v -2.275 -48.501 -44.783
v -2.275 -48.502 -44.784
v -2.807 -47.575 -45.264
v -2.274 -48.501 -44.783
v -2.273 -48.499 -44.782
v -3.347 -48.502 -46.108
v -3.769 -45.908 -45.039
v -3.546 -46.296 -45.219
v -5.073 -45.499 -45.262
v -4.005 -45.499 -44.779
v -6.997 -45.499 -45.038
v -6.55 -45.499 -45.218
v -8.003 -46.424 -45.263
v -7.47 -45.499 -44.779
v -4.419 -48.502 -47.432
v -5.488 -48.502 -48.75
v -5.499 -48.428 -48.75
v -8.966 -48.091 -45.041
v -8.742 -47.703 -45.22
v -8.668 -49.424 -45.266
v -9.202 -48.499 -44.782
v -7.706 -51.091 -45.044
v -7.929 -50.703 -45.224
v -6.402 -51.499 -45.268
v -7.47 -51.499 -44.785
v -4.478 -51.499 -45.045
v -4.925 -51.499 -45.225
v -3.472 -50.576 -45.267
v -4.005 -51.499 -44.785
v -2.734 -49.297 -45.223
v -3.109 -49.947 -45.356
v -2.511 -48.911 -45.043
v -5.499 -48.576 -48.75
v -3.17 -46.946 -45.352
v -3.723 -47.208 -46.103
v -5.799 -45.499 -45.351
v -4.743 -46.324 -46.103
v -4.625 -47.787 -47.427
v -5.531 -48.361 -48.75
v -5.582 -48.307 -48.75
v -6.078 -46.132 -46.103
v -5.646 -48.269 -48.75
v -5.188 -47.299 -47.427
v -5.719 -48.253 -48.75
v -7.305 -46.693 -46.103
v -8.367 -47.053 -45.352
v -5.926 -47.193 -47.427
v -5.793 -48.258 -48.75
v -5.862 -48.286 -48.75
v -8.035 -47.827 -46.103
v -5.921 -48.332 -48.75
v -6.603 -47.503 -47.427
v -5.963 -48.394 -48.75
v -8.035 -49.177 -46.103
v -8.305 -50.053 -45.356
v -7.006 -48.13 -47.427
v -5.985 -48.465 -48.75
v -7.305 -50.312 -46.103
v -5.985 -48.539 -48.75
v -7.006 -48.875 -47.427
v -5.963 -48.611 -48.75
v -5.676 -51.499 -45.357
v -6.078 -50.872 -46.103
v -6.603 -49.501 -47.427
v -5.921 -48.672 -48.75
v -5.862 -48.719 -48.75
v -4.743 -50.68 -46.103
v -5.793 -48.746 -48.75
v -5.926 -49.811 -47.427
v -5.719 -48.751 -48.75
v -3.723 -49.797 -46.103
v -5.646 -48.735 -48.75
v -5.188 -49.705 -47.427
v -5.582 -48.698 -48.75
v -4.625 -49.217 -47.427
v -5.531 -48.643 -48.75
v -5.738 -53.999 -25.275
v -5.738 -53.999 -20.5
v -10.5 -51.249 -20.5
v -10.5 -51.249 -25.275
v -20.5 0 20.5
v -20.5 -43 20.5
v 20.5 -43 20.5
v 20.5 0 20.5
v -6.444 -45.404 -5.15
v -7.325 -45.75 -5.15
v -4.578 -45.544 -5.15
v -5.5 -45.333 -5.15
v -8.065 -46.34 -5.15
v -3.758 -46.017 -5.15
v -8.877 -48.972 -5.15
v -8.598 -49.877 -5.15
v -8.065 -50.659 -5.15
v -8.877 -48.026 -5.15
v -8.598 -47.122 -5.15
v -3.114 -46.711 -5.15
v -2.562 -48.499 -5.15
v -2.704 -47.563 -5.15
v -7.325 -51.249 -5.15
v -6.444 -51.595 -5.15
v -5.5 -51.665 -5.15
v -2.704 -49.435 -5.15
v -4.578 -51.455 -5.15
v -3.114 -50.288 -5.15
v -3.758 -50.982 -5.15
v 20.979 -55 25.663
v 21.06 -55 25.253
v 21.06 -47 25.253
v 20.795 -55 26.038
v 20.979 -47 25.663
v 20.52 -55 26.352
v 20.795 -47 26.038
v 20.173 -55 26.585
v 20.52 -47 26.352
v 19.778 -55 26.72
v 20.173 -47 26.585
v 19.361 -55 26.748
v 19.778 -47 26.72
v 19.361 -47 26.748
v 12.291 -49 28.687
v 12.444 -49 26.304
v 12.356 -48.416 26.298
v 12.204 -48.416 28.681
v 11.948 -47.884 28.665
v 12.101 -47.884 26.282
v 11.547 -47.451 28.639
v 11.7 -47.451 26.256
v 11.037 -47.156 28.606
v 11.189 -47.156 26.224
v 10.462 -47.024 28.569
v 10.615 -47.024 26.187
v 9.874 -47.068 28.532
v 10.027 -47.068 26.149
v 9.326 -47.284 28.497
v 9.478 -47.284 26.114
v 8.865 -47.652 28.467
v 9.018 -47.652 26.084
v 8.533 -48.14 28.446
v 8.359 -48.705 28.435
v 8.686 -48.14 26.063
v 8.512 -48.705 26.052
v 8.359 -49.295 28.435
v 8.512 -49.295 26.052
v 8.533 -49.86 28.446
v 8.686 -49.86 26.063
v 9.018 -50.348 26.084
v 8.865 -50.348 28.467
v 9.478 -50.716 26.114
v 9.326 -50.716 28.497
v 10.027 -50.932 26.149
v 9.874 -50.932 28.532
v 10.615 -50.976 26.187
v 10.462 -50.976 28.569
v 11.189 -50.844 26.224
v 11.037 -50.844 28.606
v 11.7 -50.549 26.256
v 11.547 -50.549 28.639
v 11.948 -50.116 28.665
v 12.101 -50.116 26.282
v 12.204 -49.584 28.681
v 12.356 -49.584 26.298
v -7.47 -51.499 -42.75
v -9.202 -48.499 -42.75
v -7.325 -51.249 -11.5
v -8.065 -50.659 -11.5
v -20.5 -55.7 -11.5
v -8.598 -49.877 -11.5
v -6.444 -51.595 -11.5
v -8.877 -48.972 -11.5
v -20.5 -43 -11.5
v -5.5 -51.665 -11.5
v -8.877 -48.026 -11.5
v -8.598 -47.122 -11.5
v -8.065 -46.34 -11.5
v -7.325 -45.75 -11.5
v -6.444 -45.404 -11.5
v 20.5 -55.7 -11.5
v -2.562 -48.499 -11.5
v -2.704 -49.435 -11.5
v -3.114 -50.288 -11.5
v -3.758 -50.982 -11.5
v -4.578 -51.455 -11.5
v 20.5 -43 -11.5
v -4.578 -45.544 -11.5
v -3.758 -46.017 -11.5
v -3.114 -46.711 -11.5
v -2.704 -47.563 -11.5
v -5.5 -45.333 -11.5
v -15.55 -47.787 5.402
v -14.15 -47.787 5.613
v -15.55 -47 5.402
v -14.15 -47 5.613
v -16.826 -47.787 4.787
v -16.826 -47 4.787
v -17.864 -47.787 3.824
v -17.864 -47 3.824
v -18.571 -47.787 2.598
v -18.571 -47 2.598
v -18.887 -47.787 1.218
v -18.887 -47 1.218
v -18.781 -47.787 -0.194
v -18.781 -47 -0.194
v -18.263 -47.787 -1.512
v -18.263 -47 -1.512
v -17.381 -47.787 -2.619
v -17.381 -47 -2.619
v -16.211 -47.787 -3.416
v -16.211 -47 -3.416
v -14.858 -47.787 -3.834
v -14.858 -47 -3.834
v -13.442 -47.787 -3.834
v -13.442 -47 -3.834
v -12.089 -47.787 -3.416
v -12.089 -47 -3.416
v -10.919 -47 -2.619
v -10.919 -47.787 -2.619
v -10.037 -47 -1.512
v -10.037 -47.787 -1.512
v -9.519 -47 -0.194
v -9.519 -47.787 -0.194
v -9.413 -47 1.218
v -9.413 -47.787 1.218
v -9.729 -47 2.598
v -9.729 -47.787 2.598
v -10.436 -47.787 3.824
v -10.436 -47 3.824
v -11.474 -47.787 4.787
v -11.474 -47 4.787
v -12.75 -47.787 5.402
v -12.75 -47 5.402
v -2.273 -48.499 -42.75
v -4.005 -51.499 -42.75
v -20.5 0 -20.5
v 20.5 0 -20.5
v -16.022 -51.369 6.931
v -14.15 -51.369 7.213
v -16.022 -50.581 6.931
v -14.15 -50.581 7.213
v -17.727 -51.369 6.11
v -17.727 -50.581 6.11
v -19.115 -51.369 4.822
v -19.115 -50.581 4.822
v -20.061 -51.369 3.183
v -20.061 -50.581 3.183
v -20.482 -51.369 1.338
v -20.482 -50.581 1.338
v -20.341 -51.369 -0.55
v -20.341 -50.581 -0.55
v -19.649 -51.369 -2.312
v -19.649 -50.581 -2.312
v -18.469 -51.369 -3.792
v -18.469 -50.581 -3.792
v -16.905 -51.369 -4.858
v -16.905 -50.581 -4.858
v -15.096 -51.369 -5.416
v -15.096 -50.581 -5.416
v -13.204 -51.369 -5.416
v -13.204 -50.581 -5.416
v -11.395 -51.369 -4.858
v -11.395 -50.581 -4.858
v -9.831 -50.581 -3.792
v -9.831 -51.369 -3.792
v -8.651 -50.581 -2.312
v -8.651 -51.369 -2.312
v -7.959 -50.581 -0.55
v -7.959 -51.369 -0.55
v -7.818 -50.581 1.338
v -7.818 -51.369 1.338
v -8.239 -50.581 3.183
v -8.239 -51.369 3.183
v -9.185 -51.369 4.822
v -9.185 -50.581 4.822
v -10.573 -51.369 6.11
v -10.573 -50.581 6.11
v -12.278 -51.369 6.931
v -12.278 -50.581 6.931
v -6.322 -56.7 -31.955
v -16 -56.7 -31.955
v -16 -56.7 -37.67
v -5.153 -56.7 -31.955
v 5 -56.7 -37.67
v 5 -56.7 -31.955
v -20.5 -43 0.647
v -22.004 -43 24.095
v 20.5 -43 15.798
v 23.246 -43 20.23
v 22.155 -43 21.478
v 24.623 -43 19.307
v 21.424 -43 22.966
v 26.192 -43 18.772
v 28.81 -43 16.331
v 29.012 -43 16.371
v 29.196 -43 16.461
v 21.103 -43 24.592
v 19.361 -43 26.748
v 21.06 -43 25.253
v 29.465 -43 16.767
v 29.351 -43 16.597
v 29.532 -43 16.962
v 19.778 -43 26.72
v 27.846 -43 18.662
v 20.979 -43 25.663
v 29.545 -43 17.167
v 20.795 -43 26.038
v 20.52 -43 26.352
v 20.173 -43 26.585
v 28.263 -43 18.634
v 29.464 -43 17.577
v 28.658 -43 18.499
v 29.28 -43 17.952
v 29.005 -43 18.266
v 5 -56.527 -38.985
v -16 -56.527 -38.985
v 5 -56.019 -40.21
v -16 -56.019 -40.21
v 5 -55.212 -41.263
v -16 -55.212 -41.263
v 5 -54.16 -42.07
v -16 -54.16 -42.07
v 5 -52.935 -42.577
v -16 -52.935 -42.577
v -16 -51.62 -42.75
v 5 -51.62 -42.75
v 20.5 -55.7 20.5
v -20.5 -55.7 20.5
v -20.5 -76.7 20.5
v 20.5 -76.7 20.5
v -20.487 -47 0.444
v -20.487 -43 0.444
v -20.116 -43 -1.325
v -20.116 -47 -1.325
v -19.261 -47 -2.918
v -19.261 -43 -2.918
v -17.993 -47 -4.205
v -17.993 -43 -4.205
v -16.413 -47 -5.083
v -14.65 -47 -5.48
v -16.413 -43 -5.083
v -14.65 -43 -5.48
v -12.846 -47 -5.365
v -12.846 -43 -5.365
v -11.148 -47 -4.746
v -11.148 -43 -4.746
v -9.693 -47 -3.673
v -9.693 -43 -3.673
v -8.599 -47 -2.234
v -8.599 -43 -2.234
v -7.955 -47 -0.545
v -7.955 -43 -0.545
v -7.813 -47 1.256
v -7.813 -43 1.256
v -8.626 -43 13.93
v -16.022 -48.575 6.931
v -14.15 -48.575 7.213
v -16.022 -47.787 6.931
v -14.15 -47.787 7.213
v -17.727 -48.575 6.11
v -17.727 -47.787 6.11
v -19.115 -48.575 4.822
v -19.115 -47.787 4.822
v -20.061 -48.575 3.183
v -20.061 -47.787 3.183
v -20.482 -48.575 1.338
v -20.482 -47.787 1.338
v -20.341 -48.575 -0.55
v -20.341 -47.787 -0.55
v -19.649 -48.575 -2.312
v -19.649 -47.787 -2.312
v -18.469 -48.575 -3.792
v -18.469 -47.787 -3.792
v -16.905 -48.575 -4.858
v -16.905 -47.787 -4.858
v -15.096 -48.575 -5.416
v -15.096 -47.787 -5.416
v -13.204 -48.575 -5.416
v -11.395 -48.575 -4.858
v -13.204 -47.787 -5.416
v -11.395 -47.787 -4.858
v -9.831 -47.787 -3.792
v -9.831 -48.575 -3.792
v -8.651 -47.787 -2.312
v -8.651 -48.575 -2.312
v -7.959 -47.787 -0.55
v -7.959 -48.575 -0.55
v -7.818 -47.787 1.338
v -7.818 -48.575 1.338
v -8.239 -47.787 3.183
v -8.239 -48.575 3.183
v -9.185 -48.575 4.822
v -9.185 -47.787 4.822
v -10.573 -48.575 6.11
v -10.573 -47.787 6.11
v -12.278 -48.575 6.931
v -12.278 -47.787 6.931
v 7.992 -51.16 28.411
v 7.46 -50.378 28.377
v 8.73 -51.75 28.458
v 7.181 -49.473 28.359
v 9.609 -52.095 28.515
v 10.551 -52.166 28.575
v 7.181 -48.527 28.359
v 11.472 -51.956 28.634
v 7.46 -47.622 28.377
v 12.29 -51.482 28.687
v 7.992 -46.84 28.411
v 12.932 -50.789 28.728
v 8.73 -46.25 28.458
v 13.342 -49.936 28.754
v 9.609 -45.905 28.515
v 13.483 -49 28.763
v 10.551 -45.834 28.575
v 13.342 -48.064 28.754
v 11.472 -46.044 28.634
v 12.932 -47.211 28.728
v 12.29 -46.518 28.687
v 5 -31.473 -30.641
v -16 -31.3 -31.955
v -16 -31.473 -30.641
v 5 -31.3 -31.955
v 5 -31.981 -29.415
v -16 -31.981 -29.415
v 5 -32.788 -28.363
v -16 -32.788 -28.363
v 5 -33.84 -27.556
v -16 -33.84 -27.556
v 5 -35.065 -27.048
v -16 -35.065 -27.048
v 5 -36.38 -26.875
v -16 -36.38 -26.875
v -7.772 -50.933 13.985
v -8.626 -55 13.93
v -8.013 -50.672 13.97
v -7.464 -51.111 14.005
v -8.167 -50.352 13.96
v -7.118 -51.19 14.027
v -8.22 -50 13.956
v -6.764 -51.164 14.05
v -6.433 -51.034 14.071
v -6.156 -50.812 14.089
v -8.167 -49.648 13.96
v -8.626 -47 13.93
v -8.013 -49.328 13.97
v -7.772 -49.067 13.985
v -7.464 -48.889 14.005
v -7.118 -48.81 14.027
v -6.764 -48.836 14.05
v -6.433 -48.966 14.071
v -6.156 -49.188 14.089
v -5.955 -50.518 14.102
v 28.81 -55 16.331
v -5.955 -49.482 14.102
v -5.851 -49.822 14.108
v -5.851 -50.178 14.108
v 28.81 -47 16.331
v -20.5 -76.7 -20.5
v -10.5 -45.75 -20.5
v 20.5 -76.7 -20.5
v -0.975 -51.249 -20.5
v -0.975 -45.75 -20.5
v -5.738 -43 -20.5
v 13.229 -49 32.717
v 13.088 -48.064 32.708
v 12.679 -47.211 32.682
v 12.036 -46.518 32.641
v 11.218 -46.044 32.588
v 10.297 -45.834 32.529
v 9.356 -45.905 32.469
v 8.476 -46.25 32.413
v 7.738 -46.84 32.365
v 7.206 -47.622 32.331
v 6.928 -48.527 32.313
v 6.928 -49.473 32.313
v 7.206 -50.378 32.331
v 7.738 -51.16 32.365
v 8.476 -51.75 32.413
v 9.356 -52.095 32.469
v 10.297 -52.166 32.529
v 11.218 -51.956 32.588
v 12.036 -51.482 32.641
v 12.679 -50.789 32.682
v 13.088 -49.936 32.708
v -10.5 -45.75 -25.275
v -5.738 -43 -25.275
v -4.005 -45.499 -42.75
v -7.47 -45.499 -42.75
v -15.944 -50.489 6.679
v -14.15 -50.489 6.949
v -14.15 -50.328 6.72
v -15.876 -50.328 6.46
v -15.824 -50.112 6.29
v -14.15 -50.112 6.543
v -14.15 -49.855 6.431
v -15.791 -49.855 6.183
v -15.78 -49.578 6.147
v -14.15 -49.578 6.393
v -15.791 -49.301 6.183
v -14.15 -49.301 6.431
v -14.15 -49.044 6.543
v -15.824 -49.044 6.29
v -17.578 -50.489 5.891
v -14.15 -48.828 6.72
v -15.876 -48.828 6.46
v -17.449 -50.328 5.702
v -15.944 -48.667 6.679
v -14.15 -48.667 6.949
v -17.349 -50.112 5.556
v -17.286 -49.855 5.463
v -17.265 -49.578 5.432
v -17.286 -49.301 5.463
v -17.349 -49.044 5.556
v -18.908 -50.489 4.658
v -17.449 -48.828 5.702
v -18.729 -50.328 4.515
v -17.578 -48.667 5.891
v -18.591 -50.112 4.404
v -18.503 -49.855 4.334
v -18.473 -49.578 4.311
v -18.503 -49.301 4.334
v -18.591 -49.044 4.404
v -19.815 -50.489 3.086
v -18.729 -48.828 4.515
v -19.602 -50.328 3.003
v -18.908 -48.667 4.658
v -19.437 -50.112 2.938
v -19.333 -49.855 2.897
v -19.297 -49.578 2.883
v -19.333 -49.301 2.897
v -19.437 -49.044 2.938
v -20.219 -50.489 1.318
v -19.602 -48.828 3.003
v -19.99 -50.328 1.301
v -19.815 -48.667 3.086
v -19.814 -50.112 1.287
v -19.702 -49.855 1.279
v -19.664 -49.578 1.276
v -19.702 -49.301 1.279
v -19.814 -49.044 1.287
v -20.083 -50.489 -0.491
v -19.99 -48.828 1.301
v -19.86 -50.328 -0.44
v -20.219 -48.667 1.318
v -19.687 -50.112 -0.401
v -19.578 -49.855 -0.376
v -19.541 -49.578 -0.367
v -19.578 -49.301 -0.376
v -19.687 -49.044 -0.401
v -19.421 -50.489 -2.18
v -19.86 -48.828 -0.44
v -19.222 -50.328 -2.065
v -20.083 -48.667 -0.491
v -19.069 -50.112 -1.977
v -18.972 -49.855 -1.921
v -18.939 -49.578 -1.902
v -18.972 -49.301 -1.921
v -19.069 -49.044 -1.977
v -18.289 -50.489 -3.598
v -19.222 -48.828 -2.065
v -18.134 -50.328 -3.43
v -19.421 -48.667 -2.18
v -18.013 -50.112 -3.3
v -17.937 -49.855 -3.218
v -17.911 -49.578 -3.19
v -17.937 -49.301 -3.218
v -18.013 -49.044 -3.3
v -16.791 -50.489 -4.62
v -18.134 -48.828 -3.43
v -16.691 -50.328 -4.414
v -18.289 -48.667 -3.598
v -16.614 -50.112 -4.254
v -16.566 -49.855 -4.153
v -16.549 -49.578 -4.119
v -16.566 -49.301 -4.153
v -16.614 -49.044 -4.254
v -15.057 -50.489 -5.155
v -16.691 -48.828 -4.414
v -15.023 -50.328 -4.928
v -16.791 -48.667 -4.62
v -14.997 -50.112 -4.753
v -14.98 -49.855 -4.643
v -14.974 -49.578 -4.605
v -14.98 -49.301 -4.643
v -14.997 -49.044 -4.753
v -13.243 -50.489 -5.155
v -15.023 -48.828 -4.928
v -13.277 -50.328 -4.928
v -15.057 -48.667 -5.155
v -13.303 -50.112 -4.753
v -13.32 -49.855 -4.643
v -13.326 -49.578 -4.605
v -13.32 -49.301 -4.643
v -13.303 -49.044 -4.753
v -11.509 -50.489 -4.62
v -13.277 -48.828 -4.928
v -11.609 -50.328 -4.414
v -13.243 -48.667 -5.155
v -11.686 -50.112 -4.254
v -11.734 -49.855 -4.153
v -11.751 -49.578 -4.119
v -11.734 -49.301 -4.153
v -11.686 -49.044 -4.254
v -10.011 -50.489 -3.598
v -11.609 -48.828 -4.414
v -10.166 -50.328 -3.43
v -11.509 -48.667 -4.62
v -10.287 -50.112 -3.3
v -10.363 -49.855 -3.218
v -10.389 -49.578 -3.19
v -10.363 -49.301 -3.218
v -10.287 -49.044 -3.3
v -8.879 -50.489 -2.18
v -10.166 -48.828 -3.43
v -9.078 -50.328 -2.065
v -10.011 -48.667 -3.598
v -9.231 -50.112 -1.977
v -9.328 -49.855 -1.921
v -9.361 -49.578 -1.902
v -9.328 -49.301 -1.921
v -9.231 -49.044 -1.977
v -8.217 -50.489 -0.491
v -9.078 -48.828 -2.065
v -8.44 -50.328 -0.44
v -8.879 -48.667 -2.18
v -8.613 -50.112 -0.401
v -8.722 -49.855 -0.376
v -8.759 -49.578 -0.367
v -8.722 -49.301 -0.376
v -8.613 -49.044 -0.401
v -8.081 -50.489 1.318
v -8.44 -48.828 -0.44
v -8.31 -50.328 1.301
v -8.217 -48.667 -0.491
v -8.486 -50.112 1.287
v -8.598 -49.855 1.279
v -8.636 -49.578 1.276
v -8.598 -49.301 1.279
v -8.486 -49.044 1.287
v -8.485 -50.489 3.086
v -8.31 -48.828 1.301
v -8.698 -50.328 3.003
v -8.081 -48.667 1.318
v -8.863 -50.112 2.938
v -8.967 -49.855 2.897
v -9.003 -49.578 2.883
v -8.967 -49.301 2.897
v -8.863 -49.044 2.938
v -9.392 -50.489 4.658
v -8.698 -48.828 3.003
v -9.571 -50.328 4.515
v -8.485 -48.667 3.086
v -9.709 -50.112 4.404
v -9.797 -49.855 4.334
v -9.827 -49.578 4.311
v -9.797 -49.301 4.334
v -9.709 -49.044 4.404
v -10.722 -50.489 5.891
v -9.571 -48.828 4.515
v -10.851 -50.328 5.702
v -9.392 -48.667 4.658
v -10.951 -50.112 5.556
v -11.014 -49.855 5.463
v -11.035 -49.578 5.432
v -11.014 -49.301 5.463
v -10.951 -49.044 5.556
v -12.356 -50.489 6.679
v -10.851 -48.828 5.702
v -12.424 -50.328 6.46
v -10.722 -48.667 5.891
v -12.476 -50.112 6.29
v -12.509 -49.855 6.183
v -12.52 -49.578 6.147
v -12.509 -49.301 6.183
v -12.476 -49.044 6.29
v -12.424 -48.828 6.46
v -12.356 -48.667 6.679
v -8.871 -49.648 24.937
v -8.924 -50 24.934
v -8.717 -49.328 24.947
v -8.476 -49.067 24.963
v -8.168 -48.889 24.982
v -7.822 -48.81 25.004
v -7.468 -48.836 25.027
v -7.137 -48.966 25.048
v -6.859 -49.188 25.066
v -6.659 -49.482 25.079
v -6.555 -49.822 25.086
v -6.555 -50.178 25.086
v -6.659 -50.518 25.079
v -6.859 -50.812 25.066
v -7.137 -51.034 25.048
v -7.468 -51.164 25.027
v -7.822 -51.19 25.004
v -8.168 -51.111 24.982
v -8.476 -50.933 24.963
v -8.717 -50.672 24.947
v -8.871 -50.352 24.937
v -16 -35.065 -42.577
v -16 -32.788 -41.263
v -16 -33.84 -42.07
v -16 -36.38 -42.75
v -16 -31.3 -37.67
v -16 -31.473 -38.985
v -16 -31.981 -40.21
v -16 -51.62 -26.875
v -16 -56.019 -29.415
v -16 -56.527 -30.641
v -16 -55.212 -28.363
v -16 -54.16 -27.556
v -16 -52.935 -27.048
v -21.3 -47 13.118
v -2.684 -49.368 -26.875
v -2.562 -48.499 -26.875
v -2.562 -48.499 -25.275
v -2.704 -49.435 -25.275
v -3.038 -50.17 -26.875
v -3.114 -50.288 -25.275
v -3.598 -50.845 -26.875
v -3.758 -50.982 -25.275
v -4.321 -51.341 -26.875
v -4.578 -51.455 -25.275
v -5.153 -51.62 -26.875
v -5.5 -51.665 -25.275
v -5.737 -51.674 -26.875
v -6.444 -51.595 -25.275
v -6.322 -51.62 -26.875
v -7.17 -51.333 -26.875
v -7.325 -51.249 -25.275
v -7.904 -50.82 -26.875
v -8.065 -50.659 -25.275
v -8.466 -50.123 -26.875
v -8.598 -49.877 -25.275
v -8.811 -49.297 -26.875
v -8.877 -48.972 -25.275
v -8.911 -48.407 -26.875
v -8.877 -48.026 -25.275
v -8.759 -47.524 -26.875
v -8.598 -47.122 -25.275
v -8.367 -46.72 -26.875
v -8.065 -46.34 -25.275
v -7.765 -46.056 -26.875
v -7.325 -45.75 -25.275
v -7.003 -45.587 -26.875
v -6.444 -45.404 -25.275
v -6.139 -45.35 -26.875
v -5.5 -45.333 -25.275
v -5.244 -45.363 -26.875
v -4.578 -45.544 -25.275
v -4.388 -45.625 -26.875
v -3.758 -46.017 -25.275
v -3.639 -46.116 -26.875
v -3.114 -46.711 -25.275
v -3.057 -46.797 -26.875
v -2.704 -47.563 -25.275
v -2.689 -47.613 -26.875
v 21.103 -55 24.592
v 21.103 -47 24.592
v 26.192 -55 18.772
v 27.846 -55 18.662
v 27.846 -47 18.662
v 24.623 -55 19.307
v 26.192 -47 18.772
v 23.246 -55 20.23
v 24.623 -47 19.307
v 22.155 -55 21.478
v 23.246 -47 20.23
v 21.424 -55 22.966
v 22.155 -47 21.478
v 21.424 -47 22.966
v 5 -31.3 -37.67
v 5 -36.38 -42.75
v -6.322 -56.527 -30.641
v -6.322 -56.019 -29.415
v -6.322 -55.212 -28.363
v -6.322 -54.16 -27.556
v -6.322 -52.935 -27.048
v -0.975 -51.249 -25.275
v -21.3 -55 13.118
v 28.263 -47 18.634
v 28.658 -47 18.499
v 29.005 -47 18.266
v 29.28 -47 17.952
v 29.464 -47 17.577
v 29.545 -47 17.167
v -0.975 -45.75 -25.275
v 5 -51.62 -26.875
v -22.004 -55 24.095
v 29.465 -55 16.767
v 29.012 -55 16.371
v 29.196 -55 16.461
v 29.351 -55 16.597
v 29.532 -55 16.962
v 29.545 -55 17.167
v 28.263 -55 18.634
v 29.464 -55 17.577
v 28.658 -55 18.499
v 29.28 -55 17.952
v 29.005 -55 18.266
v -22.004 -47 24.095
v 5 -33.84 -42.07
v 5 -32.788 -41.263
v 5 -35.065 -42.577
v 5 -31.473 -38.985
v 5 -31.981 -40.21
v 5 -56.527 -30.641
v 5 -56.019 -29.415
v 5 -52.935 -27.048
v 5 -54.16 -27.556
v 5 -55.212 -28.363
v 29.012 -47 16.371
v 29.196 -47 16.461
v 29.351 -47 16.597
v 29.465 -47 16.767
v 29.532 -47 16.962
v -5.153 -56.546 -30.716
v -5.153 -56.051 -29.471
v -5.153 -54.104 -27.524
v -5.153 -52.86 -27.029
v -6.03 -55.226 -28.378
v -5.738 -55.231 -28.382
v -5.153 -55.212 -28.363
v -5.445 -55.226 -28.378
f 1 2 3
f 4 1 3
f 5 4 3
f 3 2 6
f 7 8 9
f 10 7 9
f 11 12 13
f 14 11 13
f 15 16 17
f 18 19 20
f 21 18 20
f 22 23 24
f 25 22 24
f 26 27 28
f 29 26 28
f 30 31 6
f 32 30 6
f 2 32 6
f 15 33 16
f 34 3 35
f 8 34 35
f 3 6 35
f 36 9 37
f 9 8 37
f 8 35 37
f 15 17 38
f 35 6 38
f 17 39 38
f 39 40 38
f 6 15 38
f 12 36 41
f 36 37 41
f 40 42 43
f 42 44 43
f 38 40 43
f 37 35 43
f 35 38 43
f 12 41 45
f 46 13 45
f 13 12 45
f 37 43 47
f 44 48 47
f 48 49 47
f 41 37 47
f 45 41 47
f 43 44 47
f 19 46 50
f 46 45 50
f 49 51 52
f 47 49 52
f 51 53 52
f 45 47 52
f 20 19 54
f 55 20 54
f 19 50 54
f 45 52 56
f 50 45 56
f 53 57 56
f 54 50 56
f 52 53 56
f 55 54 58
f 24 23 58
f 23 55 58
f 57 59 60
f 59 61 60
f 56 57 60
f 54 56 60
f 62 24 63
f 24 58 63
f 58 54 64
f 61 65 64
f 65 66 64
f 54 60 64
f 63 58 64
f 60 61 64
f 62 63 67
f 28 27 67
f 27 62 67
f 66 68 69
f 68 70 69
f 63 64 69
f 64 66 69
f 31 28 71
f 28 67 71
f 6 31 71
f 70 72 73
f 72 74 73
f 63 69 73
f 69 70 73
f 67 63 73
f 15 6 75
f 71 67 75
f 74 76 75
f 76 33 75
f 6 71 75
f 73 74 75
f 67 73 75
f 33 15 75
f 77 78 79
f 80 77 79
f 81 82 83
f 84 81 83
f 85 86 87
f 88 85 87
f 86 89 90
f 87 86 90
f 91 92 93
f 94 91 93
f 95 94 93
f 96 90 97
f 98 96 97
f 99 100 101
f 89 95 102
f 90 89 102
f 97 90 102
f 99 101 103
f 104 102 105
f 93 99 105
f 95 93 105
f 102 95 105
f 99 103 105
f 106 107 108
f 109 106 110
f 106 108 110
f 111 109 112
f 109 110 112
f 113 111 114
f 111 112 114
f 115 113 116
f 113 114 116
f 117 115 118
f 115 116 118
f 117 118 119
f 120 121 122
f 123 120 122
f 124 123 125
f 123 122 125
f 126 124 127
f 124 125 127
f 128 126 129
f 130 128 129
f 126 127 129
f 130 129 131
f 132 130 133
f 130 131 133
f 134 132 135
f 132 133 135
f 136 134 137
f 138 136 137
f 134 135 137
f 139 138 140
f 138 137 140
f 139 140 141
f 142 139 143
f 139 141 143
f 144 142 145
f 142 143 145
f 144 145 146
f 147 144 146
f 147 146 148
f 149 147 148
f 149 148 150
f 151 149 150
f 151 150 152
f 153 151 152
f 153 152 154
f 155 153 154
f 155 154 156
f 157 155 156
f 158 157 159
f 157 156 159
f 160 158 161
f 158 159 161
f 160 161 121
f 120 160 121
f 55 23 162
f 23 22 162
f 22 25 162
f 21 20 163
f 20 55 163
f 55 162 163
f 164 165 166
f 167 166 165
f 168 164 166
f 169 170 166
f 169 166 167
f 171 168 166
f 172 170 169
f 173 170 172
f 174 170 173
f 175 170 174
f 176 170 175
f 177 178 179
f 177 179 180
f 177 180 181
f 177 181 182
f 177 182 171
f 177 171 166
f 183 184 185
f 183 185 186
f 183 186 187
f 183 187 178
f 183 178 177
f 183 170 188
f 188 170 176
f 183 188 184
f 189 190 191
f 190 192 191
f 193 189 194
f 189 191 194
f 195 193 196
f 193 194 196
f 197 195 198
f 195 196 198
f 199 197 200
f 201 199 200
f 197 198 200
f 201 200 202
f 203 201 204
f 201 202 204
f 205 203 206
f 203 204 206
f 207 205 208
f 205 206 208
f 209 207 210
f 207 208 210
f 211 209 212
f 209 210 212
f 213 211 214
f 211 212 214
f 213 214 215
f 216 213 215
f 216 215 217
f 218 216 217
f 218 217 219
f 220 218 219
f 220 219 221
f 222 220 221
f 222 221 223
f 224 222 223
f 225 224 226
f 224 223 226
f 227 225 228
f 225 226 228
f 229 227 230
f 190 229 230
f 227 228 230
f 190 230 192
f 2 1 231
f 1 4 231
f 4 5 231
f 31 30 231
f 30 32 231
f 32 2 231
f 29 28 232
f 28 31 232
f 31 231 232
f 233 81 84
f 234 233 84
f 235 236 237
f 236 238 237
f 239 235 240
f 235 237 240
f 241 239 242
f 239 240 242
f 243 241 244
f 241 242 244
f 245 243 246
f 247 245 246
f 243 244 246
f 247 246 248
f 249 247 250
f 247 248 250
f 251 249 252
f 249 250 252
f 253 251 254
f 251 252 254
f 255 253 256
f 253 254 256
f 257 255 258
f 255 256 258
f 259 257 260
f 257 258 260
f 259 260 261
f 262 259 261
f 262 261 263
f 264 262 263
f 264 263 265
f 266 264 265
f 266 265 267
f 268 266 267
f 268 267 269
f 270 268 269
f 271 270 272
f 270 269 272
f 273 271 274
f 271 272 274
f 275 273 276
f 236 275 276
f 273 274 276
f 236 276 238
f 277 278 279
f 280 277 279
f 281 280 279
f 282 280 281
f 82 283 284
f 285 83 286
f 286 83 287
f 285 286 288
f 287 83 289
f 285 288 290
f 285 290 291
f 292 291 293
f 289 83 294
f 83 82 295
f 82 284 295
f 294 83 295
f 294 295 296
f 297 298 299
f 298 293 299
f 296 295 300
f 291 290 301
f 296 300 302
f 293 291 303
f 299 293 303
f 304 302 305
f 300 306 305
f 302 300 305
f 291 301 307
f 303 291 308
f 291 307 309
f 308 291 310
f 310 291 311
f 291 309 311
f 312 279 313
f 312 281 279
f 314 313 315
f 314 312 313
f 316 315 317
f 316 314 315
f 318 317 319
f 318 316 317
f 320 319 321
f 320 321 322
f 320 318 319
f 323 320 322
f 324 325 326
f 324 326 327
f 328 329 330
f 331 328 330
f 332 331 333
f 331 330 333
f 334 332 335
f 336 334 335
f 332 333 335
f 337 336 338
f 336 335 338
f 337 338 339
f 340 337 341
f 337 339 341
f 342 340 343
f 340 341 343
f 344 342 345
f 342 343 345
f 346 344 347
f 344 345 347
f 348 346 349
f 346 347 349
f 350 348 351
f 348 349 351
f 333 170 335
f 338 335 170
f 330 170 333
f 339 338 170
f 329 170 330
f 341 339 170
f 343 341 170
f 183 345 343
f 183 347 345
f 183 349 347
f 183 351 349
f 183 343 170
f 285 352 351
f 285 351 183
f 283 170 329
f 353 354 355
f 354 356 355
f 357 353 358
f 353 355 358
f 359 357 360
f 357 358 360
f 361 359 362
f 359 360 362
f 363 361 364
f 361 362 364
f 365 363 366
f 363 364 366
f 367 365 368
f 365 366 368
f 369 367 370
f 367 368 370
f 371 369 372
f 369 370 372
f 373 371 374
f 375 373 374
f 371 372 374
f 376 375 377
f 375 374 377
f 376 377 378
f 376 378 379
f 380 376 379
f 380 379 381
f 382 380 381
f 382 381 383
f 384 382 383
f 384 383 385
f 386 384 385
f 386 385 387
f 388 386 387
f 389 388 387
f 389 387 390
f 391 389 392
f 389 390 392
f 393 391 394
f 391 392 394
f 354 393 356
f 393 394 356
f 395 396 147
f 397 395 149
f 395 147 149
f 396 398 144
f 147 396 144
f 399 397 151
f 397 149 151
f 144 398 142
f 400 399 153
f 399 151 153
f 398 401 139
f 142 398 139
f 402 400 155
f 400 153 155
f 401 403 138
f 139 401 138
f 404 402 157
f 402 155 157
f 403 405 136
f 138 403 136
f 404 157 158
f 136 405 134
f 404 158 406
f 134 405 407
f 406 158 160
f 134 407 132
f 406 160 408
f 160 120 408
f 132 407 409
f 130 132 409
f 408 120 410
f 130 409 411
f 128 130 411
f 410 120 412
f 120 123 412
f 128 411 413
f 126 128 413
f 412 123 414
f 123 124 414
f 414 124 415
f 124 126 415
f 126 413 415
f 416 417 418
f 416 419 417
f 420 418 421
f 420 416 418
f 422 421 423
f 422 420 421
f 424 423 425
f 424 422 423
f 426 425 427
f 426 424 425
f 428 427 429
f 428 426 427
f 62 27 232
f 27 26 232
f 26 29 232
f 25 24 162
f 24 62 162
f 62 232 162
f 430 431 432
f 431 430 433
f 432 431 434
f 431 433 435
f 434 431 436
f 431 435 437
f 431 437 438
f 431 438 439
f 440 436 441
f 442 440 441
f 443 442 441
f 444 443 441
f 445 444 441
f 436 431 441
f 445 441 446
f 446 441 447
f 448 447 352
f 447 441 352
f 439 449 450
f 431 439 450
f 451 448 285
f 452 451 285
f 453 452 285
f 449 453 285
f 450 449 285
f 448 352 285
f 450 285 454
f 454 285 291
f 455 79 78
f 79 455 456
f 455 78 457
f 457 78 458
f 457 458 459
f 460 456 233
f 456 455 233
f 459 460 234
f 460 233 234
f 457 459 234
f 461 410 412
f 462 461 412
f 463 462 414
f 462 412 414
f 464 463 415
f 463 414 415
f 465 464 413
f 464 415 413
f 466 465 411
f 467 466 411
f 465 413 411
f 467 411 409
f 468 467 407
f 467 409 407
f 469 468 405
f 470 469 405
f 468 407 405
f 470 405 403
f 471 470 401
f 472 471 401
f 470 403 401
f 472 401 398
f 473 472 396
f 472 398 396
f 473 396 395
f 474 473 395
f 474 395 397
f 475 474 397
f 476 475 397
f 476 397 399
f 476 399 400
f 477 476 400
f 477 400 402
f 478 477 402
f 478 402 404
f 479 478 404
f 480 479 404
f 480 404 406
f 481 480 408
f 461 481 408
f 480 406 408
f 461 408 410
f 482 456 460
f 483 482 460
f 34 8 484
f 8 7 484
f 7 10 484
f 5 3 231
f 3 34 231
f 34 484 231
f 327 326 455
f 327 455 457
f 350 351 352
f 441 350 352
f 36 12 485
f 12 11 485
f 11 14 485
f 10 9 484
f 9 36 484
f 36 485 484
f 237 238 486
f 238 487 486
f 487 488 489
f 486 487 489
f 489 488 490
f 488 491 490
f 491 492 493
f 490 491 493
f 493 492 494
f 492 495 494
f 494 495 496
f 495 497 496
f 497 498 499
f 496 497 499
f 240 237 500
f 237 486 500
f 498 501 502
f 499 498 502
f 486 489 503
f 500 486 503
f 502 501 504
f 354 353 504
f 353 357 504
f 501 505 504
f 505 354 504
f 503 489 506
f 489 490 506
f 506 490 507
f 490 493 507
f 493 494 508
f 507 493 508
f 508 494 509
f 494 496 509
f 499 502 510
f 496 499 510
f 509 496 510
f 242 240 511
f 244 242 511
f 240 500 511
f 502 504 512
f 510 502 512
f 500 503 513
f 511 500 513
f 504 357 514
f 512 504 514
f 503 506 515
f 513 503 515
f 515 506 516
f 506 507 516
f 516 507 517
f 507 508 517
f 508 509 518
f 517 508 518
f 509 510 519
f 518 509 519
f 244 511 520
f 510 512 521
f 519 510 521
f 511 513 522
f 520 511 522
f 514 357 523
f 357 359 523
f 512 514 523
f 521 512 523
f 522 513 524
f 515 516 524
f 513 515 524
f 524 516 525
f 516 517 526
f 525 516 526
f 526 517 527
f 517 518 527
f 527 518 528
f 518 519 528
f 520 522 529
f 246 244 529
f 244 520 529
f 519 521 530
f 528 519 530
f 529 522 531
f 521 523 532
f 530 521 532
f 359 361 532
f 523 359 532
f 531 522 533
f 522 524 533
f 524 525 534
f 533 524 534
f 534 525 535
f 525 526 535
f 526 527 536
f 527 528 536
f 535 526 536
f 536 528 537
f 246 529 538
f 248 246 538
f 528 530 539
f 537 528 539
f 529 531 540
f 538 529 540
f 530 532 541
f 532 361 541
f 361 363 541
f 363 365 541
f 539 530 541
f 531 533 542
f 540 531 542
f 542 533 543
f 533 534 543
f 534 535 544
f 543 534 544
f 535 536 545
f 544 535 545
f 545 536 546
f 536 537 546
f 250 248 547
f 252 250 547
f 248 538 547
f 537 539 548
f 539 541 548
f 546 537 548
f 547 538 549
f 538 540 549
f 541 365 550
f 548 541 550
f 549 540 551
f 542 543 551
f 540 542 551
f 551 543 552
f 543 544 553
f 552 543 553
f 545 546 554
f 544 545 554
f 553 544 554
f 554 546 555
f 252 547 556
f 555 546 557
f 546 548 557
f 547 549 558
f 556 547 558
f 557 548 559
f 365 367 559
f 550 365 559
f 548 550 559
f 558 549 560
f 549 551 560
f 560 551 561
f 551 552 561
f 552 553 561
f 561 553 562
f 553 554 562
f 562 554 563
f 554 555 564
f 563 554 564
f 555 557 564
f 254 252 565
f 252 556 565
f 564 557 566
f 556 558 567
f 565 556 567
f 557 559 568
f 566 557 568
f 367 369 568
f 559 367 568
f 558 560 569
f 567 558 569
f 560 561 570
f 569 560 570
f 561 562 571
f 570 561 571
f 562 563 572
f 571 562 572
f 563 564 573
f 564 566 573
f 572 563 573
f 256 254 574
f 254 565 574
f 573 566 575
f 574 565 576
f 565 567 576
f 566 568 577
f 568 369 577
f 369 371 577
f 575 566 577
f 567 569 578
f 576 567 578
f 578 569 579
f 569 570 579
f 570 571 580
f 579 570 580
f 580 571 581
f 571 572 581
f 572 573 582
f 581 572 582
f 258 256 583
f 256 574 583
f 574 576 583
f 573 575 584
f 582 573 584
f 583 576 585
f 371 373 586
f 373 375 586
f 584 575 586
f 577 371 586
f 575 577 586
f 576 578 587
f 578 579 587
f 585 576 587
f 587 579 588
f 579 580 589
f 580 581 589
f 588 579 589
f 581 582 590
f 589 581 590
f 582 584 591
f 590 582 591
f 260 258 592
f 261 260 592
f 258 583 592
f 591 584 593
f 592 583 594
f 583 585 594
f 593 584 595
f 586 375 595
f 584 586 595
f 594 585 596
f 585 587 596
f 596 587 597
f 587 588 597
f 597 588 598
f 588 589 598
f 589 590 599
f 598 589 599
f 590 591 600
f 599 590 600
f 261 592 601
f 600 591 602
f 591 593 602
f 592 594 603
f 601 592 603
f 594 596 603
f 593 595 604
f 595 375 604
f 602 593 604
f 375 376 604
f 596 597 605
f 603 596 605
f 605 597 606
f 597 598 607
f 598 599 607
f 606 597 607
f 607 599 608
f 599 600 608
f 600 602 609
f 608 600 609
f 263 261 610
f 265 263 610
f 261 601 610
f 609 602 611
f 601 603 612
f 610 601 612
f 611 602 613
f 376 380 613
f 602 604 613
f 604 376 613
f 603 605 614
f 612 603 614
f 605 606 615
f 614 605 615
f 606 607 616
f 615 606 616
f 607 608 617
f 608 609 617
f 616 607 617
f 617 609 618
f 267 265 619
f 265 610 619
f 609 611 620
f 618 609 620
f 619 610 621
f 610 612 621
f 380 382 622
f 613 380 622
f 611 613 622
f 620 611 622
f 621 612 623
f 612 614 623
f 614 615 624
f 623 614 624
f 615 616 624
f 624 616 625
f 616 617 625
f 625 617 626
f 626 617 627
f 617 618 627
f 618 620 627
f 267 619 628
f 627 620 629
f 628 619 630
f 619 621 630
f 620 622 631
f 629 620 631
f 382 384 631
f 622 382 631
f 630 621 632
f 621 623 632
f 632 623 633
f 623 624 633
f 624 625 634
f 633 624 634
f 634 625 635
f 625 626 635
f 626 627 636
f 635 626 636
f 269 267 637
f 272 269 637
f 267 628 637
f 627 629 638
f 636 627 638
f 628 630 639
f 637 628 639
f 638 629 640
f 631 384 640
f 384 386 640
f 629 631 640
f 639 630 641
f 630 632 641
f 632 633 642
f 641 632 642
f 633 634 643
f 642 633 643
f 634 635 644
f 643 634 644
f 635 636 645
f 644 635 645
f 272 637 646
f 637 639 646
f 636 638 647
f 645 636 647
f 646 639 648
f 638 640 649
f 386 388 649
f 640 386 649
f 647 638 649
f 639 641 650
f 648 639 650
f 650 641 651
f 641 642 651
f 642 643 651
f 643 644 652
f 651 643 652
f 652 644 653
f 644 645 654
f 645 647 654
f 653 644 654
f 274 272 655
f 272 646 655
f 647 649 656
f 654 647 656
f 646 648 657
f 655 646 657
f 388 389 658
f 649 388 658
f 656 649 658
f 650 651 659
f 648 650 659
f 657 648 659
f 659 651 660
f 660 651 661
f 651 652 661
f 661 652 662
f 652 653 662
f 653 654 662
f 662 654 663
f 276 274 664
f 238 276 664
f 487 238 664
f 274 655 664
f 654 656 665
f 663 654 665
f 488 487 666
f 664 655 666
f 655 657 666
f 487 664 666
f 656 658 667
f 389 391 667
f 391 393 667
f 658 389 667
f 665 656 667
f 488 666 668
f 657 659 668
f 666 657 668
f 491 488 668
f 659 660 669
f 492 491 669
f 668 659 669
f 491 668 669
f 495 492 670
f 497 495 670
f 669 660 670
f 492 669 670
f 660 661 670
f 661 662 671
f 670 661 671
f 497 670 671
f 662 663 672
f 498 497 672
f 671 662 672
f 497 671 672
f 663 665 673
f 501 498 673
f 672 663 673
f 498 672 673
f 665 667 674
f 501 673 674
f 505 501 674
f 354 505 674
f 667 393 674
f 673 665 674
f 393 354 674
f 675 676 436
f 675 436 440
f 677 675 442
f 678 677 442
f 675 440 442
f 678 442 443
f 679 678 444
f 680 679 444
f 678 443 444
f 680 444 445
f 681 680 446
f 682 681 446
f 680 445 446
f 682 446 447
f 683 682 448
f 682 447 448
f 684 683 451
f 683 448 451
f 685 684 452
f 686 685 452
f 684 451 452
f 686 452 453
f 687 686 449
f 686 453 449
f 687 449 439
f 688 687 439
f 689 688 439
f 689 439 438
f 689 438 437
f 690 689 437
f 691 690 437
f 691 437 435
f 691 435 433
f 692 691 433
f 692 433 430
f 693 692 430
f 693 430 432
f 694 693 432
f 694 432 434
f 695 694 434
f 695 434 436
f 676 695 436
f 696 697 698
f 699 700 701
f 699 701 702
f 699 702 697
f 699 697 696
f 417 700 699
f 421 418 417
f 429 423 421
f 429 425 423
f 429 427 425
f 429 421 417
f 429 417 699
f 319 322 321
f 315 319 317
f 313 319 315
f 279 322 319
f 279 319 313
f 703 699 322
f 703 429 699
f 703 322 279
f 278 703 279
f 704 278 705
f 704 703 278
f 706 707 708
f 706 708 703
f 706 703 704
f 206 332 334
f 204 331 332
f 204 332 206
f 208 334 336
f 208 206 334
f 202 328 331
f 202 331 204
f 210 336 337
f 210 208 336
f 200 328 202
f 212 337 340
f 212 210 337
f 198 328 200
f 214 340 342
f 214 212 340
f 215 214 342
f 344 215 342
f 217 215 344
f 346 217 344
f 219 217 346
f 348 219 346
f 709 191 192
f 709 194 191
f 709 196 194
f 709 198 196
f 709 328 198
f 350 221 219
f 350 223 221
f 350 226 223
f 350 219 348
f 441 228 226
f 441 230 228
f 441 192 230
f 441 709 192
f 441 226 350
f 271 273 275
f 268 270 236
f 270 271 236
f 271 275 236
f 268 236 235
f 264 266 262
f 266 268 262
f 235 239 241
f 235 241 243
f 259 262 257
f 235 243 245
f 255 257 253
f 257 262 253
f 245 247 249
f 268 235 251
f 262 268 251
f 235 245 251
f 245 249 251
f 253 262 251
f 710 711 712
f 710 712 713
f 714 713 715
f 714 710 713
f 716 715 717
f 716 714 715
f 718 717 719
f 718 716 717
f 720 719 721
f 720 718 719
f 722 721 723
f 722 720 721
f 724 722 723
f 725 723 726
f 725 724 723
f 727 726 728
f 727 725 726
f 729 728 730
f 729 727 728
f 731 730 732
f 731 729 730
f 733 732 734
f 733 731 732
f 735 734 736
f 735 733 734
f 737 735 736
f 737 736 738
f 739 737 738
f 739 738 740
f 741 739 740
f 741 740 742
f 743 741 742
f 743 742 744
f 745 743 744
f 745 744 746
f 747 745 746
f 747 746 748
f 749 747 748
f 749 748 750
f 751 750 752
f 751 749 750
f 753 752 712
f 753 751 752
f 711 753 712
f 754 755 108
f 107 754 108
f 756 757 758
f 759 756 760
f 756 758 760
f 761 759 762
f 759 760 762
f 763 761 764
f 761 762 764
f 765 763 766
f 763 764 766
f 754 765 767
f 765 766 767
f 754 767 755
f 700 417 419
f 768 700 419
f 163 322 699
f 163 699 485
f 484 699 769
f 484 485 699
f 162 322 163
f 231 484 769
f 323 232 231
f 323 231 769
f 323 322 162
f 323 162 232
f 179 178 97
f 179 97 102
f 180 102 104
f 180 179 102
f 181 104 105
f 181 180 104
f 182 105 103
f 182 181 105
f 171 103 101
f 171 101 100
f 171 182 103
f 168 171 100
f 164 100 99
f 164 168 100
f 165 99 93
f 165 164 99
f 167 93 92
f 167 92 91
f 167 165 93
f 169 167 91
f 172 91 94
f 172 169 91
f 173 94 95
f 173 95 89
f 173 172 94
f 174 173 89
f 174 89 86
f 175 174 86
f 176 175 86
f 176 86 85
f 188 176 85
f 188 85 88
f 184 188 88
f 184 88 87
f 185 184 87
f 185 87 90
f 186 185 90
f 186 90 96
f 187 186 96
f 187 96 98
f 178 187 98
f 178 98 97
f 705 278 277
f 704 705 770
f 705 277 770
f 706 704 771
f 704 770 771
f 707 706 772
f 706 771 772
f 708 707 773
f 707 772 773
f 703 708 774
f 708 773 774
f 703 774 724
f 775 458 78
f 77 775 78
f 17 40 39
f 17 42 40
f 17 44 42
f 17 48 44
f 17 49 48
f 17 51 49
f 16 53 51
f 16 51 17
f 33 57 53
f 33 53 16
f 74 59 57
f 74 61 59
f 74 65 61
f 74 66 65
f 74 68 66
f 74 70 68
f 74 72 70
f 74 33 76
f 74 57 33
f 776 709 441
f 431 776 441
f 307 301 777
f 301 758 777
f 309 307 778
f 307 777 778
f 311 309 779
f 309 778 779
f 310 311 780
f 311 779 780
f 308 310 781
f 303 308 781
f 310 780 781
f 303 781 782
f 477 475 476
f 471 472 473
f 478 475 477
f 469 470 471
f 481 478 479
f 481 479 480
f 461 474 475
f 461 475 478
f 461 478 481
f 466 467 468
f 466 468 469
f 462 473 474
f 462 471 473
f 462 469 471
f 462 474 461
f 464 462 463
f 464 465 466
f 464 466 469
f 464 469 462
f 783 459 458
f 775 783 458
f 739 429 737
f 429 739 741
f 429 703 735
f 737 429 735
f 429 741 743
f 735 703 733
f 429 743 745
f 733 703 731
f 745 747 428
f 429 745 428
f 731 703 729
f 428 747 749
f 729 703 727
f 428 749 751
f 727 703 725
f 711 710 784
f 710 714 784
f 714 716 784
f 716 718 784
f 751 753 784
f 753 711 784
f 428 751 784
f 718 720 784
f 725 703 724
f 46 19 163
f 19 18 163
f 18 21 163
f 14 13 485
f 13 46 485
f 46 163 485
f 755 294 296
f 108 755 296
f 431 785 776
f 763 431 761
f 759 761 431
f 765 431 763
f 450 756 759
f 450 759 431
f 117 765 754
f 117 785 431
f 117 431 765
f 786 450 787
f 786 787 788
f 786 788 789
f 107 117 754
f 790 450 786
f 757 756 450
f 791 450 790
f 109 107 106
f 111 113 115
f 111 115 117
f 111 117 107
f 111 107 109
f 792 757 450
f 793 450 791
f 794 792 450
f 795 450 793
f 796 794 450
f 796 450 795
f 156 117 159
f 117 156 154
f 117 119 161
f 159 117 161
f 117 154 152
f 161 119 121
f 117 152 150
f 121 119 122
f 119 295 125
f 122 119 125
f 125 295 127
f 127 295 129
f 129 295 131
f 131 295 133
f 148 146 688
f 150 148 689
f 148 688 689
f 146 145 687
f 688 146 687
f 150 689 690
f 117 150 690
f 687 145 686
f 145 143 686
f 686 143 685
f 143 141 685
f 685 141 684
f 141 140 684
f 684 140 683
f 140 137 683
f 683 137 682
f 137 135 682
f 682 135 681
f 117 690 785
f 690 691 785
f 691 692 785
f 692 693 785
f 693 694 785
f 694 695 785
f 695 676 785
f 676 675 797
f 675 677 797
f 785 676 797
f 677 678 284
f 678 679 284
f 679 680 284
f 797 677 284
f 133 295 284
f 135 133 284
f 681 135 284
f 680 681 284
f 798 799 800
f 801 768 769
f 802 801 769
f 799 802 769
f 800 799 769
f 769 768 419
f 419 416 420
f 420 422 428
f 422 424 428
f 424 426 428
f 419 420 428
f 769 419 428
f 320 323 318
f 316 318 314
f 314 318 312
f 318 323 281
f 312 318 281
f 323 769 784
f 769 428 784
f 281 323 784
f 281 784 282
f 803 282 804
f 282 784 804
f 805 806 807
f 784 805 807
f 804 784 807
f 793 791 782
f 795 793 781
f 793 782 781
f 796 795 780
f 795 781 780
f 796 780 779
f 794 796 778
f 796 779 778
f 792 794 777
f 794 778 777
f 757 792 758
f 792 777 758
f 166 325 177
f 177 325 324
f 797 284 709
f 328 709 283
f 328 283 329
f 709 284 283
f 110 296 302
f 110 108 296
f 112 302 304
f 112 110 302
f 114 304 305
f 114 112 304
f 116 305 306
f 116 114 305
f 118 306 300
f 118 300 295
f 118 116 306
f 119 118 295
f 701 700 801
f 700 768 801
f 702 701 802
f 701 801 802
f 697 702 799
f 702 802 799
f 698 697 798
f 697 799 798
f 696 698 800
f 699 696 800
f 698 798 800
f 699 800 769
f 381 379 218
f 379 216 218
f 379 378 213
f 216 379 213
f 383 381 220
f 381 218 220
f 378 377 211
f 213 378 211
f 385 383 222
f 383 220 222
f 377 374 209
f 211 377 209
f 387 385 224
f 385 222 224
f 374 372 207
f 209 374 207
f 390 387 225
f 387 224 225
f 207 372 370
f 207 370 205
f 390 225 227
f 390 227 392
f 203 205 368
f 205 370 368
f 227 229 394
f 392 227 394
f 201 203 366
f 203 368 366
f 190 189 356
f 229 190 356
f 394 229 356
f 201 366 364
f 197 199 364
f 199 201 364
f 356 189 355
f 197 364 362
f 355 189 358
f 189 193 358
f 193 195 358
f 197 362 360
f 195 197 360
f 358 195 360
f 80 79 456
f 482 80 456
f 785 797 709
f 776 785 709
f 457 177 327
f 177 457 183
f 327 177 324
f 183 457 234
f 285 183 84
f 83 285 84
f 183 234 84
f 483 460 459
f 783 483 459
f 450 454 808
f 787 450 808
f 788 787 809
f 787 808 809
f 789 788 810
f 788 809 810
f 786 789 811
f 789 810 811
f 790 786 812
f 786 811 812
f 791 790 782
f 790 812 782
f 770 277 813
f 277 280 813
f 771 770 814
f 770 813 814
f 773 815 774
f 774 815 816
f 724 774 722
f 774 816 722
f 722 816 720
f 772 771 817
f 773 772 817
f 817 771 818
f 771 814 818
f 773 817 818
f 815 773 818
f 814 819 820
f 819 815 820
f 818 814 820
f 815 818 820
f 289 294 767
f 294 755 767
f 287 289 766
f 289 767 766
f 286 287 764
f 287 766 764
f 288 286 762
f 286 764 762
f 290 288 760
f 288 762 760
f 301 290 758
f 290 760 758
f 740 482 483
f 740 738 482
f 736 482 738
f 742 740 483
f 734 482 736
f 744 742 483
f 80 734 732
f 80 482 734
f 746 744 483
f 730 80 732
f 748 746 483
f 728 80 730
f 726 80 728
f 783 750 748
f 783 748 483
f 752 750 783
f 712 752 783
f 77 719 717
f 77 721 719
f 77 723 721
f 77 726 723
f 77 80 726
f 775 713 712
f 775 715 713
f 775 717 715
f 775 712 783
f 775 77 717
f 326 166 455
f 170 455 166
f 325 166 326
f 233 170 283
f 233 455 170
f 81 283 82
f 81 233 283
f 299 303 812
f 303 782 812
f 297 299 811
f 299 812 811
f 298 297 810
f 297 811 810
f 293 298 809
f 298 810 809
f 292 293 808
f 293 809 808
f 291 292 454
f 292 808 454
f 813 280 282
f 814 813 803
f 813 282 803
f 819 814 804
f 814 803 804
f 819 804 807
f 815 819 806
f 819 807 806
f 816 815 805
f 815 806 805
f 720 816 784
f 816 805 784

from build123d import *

# Parameters (mm, degrees)
F0_W      = 41
F0_H      = 41
F1_DEPTH  = 43
F2_W      = 41
F2_H      = 9
F3_DEPTH  = 12.7
F5_DEPTH  = 4
F6_R      = 6.35
F7_R      = 1.60019
F8_R      = 1.6002
F9_R      = 0.7874
F11_DEPTH = 8
F12_W     = 41
F12_H     = 41
F13_DEPTH = 21
F15_D     = 2.3876
F15_DEPTH = 12.7
F15_TIP   = 0.717307407
F16_R     = 1.9812
F17_DEPTH = 2.3876
F18_R     = 3.175
F19_DEPTH = 3.9624
F21_DEPTH = 4.7752
F23_R     = 3.175
F24_DEPTH = 21.7254
F28_W     = 21
F28_H     = 25.4
F29_DEPTH = 15.875
F30_R     = 5.08
F32_DEPTH = 6


# Not quite as in the source:
# - a fillet or chamfer is up to 0.001 mm smaller than in the source, because OpenCascade refuses the exact size


with BuildPart() as f1:
    # F0 (on Front) → F1 (new body)
    with BuildSketch(Plane.XZ):
        Rectangle(F0_W, F0_H)
    extrude(amount=F1_DEPTH)

    # F2 (on face) → F3 (join)
    with BuildSketch(Plane.XZ.offset(43)):
        with Locations((0, -16)):
            Rectangle(F2_W, F2_H)
    extrude(amount=F3_DEPTH)

    # F4 (on face) → F5 (join)
    with BuildSketch(Plane.XZ.offset(43)):
        with BuildLine():
            Line((-22.0036495704, 24.0950572902), (-20.4869841684, 0.4436360632))
            ThreePointArc((-20.4869841684, 0.4436360632), (-13.7436360632, -5.4869841684), (-7.8130158316, 1.2563639368))
            Line((-7.8130158316, 1.2563639368), (-8.6257437052, 13.9303322737))
            Line((-8.6257437052, 13.9303322737), (29.5957513579, 16.3813147587))
            Line((29.5957513579, 16.3813147587), (29.4429585176, 18.764020806))
            Line((29.4429585176, 18.764020806), (21.5090543388, 18.2552531571))
            Line((21.5090543388, 18.2552531571), (20.9579096507, 26.85))
            Line((20.9579096507, 26.85), (-22.0036495704, 24.0950572902))
        make_face()
    extrude(amount=F5_DEPTH)

    # F6
    f6_edges = [f1.edges().sort_by_distance(p)[0] for p in [
        (21.509054, -45, 18.255253),
    ]]
    fillet(f6_edges, radius=F6_R)

    # F7 (radius 1.6002 in the source; OpenCascade refuses exactly that, so slightly less here)
    f7_edges = [f1.edges().sort_by_distance(p)[0] for p in [
        (29.442959, -45, 18.764021),
    ]]
    fillet(f7_edges, radius=F7_R)

    # F8
    f8_edges = [f1.edges().sort_by_distance(p)[0] for p in [
        (20.95791, -45, 26.85),
    ]]
    fillet(f8_edges, radius=F8_R)

    # F9
    f9_edges = [f1.edges().sort_by_distance(p)[0] for p in [
        (29.595751, -45, 16.381315),
    ]]
    fillet(f9_edges, radius=F9_R)

    # F10 (on face) → F11 (join)
    with BuildSketch(Plane.XZ.offset(47)):
        with BuildLine():
            Line((19.3609896402, 26.7475962879), (-22.0036495704, 24.0950572902))
            Line((-22.0036495704, 24.0950572902), (-21.2997120421, 13.1176044))
            Line((-21.2997120421, 13.1176044), (-8.6257437052, 13.9303322737))
            Line((-8.6257437052, 13.9303322737), (28.809965321, 16.3309256305))
            ThreePointArc((28.809965321, 16.3309256305), (29.3508413223, 16.5967075264), (29.5453622297, 17.1671007956))
            ThreePointArc((29.5453622297, 17.1671007956), (29.0052248284, 18.2663004111), (27.8460385072, 18.661617094))
            ThreePointArc((27.8460385072, 18.661617094), (23.246092788, 20.2303340893), (21.102690402, 24.5922373256))
            Line((21.102690402, 24.5922373256), (21.0603133628, 25.2530799896))
            ThreePointArc((21.0603133628, 25.2530799896), (20.5201759615, 26.3522796051), (19.3609896402, 26.7475962879))
        make_face()
    extrude(amount=F11_DEPTH)

    # F12 (on face) → F13 (join)
    with BuildSketch(Plane.XZ.offset(55.7)):
        Rectangle(F12_W, F12_H)
    extrude(amount=F13_DEPTH)

    # F15
    with Locations(Plane(origin=(-1.628897193, 0, 25.4016038063), x_dir=(0.9979502627, 0, 0.0639943208), z_dir=(-0.0639943208, 0, 0.9979502627))):
        with Locations((-6.1164010452, -50)):
            Hole(F15_D / 2, depth=F15_DEPTH)
            with Locations((0, 0, -(F15_DEPTH + F15_TIP / 2))):  # 118° drill point
                Cone(0, F15_D / 2, F15_TIP, mode=Mode.SUBTRACT)

    # F16 (on face) → F17 (join)
    with BuildSketch(Plane(origin=(-1.628897193, 0, 25.4016038063), x_dir=(0.9979502627, 0, 0.0639943208), z_dir=(-0.0639943208, 0, 0.9979502627))):
        with Locations((12.1207989548, -49)):
            Circle(F16_R)
    extrude(amount=F17_DEPTH)

    # F18 (on face) → F19 (join)
    with BuildSketch(Plane(origin=(-1.7816900333, 0, 27.7843098536), x_dir=(0.9979502627, 0, 0.0639943208), z_dir=(-0.0639943208, 0, 0.9979502627))):
        with Locations((12.1207989548, -49)):
            Circle(F18_R)
    extrude(amount=F19_DEPTH)

    # F20 (on face) → F21 (join)
    with BuildSketch(Plane(origin=(0, 0, -20.5), x_dir=(1, 0, 0), z_dir=(0, 0, -1))):
        Polygon((-5.7375, 43), (-0.975, 45.749630657), (-0.975, 51.248891971), (-5.7375, 53.9985226281), (-10.5, 51.248891971), (-10.5, 45.749630657), align=None)
    extrude(amount=F21_DEPTH)

    # F23 (on offset) → F24 (join, through all)
    with BuildSketch(Plane(origin=(0, 0, -26.8754), x_dir=(1, 0, 0), z_dir=(0, 0, -1))):
        with Locations((-5.7375, 48.499261314)):
            Circle(F23_R)
    extrude(amount=-F24_DEPTH)

    # F26 (on face) → F27 (revolve)
    with BuildSketch(Plane(origin=(-14.15, 0, 0), x_dir=(0, -1, 0), z_dir=(-1, 0, 0))):
        with BuildLine():
            Line((47.7874, 5.6128158316), (47, 5.6128158316))
            Line((47, 5.6128158316), (47, 0.8630158316))
            Line((47, 0.8630158316), (51.3688, 0.8630158316))
            Line((51.3688, 0.8630158316), (51.3688, 7.2130158316))
            Line((51.3688, 7.2130158316), (50.5814, 7.2130158316))
            ThreePointArc((50.5814, 7.2130158316), (49.5781, 6.392545411), (48.5748, 7.2130158316))
            Line((48.5748, 7.2130158316), (47.7874, 7.2130158316))
            Line((47.7874, 7.2130158316), (47.7874, 5.6128158316))
        make_face()
    revolve(axis=Axis((-14.15, -49.1844, 0.8630158316), (0, -1, 0)))

    # F28 (on face) → F29 (join)
    with BuildSketch(Plane(origin=(0, 0, -26.8754), x_dir=(1, 0, 0), z_dir=(0, 0, -1))):
        with Locations((-5.5, 44)):
            Rectangle(F28_W, F28_H)
    extrude(amount=F29_DEPTH)

    # F30
    f30_edges = [f1.edges().sort_by_distance(p)[0] for p in [
        (-5.5, -56.7, -42.7504),
        (-5.5, -56.7, -26.8754),
        (-5.5, -31.3, -42.7504),
        (-5.5, -31.3, -26.8754),
    ]]
    fillet(f30_edges, radius=F30_R)

    # F31 (on face) → F32 (join)
    with BuildSketch(Plane(origin=(0, 0, -42.7504), x_dir=(1, 0, 0), z_dir=(0, 0, -1))):
        Polygon((-4.0054491924, 45.499261314), (-2.2733983849, 48.499261314), (-4.0054491924, 51.499261314), (-7.4695508076, 51.499261314), (-9.2016016151, 48.499261314), (-7.4695508076, 45.499261314), align=None)
    extrude(amount=F32_DEPTH)

    # F34 (on offset) → F35 (revolve, cut)
    with BuildSketch(Plane.XZ.offset(48.502061314)):
        Polygon((-2.2479983849, -44.7504), (-5.4875, -48.7504), (-2.2479983849, -48.7504), align=None)
    revolve(axis=Axis((-5.7375, -48.502061314, -47.4463791664), (0, 0, 1)), mode=Mode.SUBTRACT)


solid = f1.part
